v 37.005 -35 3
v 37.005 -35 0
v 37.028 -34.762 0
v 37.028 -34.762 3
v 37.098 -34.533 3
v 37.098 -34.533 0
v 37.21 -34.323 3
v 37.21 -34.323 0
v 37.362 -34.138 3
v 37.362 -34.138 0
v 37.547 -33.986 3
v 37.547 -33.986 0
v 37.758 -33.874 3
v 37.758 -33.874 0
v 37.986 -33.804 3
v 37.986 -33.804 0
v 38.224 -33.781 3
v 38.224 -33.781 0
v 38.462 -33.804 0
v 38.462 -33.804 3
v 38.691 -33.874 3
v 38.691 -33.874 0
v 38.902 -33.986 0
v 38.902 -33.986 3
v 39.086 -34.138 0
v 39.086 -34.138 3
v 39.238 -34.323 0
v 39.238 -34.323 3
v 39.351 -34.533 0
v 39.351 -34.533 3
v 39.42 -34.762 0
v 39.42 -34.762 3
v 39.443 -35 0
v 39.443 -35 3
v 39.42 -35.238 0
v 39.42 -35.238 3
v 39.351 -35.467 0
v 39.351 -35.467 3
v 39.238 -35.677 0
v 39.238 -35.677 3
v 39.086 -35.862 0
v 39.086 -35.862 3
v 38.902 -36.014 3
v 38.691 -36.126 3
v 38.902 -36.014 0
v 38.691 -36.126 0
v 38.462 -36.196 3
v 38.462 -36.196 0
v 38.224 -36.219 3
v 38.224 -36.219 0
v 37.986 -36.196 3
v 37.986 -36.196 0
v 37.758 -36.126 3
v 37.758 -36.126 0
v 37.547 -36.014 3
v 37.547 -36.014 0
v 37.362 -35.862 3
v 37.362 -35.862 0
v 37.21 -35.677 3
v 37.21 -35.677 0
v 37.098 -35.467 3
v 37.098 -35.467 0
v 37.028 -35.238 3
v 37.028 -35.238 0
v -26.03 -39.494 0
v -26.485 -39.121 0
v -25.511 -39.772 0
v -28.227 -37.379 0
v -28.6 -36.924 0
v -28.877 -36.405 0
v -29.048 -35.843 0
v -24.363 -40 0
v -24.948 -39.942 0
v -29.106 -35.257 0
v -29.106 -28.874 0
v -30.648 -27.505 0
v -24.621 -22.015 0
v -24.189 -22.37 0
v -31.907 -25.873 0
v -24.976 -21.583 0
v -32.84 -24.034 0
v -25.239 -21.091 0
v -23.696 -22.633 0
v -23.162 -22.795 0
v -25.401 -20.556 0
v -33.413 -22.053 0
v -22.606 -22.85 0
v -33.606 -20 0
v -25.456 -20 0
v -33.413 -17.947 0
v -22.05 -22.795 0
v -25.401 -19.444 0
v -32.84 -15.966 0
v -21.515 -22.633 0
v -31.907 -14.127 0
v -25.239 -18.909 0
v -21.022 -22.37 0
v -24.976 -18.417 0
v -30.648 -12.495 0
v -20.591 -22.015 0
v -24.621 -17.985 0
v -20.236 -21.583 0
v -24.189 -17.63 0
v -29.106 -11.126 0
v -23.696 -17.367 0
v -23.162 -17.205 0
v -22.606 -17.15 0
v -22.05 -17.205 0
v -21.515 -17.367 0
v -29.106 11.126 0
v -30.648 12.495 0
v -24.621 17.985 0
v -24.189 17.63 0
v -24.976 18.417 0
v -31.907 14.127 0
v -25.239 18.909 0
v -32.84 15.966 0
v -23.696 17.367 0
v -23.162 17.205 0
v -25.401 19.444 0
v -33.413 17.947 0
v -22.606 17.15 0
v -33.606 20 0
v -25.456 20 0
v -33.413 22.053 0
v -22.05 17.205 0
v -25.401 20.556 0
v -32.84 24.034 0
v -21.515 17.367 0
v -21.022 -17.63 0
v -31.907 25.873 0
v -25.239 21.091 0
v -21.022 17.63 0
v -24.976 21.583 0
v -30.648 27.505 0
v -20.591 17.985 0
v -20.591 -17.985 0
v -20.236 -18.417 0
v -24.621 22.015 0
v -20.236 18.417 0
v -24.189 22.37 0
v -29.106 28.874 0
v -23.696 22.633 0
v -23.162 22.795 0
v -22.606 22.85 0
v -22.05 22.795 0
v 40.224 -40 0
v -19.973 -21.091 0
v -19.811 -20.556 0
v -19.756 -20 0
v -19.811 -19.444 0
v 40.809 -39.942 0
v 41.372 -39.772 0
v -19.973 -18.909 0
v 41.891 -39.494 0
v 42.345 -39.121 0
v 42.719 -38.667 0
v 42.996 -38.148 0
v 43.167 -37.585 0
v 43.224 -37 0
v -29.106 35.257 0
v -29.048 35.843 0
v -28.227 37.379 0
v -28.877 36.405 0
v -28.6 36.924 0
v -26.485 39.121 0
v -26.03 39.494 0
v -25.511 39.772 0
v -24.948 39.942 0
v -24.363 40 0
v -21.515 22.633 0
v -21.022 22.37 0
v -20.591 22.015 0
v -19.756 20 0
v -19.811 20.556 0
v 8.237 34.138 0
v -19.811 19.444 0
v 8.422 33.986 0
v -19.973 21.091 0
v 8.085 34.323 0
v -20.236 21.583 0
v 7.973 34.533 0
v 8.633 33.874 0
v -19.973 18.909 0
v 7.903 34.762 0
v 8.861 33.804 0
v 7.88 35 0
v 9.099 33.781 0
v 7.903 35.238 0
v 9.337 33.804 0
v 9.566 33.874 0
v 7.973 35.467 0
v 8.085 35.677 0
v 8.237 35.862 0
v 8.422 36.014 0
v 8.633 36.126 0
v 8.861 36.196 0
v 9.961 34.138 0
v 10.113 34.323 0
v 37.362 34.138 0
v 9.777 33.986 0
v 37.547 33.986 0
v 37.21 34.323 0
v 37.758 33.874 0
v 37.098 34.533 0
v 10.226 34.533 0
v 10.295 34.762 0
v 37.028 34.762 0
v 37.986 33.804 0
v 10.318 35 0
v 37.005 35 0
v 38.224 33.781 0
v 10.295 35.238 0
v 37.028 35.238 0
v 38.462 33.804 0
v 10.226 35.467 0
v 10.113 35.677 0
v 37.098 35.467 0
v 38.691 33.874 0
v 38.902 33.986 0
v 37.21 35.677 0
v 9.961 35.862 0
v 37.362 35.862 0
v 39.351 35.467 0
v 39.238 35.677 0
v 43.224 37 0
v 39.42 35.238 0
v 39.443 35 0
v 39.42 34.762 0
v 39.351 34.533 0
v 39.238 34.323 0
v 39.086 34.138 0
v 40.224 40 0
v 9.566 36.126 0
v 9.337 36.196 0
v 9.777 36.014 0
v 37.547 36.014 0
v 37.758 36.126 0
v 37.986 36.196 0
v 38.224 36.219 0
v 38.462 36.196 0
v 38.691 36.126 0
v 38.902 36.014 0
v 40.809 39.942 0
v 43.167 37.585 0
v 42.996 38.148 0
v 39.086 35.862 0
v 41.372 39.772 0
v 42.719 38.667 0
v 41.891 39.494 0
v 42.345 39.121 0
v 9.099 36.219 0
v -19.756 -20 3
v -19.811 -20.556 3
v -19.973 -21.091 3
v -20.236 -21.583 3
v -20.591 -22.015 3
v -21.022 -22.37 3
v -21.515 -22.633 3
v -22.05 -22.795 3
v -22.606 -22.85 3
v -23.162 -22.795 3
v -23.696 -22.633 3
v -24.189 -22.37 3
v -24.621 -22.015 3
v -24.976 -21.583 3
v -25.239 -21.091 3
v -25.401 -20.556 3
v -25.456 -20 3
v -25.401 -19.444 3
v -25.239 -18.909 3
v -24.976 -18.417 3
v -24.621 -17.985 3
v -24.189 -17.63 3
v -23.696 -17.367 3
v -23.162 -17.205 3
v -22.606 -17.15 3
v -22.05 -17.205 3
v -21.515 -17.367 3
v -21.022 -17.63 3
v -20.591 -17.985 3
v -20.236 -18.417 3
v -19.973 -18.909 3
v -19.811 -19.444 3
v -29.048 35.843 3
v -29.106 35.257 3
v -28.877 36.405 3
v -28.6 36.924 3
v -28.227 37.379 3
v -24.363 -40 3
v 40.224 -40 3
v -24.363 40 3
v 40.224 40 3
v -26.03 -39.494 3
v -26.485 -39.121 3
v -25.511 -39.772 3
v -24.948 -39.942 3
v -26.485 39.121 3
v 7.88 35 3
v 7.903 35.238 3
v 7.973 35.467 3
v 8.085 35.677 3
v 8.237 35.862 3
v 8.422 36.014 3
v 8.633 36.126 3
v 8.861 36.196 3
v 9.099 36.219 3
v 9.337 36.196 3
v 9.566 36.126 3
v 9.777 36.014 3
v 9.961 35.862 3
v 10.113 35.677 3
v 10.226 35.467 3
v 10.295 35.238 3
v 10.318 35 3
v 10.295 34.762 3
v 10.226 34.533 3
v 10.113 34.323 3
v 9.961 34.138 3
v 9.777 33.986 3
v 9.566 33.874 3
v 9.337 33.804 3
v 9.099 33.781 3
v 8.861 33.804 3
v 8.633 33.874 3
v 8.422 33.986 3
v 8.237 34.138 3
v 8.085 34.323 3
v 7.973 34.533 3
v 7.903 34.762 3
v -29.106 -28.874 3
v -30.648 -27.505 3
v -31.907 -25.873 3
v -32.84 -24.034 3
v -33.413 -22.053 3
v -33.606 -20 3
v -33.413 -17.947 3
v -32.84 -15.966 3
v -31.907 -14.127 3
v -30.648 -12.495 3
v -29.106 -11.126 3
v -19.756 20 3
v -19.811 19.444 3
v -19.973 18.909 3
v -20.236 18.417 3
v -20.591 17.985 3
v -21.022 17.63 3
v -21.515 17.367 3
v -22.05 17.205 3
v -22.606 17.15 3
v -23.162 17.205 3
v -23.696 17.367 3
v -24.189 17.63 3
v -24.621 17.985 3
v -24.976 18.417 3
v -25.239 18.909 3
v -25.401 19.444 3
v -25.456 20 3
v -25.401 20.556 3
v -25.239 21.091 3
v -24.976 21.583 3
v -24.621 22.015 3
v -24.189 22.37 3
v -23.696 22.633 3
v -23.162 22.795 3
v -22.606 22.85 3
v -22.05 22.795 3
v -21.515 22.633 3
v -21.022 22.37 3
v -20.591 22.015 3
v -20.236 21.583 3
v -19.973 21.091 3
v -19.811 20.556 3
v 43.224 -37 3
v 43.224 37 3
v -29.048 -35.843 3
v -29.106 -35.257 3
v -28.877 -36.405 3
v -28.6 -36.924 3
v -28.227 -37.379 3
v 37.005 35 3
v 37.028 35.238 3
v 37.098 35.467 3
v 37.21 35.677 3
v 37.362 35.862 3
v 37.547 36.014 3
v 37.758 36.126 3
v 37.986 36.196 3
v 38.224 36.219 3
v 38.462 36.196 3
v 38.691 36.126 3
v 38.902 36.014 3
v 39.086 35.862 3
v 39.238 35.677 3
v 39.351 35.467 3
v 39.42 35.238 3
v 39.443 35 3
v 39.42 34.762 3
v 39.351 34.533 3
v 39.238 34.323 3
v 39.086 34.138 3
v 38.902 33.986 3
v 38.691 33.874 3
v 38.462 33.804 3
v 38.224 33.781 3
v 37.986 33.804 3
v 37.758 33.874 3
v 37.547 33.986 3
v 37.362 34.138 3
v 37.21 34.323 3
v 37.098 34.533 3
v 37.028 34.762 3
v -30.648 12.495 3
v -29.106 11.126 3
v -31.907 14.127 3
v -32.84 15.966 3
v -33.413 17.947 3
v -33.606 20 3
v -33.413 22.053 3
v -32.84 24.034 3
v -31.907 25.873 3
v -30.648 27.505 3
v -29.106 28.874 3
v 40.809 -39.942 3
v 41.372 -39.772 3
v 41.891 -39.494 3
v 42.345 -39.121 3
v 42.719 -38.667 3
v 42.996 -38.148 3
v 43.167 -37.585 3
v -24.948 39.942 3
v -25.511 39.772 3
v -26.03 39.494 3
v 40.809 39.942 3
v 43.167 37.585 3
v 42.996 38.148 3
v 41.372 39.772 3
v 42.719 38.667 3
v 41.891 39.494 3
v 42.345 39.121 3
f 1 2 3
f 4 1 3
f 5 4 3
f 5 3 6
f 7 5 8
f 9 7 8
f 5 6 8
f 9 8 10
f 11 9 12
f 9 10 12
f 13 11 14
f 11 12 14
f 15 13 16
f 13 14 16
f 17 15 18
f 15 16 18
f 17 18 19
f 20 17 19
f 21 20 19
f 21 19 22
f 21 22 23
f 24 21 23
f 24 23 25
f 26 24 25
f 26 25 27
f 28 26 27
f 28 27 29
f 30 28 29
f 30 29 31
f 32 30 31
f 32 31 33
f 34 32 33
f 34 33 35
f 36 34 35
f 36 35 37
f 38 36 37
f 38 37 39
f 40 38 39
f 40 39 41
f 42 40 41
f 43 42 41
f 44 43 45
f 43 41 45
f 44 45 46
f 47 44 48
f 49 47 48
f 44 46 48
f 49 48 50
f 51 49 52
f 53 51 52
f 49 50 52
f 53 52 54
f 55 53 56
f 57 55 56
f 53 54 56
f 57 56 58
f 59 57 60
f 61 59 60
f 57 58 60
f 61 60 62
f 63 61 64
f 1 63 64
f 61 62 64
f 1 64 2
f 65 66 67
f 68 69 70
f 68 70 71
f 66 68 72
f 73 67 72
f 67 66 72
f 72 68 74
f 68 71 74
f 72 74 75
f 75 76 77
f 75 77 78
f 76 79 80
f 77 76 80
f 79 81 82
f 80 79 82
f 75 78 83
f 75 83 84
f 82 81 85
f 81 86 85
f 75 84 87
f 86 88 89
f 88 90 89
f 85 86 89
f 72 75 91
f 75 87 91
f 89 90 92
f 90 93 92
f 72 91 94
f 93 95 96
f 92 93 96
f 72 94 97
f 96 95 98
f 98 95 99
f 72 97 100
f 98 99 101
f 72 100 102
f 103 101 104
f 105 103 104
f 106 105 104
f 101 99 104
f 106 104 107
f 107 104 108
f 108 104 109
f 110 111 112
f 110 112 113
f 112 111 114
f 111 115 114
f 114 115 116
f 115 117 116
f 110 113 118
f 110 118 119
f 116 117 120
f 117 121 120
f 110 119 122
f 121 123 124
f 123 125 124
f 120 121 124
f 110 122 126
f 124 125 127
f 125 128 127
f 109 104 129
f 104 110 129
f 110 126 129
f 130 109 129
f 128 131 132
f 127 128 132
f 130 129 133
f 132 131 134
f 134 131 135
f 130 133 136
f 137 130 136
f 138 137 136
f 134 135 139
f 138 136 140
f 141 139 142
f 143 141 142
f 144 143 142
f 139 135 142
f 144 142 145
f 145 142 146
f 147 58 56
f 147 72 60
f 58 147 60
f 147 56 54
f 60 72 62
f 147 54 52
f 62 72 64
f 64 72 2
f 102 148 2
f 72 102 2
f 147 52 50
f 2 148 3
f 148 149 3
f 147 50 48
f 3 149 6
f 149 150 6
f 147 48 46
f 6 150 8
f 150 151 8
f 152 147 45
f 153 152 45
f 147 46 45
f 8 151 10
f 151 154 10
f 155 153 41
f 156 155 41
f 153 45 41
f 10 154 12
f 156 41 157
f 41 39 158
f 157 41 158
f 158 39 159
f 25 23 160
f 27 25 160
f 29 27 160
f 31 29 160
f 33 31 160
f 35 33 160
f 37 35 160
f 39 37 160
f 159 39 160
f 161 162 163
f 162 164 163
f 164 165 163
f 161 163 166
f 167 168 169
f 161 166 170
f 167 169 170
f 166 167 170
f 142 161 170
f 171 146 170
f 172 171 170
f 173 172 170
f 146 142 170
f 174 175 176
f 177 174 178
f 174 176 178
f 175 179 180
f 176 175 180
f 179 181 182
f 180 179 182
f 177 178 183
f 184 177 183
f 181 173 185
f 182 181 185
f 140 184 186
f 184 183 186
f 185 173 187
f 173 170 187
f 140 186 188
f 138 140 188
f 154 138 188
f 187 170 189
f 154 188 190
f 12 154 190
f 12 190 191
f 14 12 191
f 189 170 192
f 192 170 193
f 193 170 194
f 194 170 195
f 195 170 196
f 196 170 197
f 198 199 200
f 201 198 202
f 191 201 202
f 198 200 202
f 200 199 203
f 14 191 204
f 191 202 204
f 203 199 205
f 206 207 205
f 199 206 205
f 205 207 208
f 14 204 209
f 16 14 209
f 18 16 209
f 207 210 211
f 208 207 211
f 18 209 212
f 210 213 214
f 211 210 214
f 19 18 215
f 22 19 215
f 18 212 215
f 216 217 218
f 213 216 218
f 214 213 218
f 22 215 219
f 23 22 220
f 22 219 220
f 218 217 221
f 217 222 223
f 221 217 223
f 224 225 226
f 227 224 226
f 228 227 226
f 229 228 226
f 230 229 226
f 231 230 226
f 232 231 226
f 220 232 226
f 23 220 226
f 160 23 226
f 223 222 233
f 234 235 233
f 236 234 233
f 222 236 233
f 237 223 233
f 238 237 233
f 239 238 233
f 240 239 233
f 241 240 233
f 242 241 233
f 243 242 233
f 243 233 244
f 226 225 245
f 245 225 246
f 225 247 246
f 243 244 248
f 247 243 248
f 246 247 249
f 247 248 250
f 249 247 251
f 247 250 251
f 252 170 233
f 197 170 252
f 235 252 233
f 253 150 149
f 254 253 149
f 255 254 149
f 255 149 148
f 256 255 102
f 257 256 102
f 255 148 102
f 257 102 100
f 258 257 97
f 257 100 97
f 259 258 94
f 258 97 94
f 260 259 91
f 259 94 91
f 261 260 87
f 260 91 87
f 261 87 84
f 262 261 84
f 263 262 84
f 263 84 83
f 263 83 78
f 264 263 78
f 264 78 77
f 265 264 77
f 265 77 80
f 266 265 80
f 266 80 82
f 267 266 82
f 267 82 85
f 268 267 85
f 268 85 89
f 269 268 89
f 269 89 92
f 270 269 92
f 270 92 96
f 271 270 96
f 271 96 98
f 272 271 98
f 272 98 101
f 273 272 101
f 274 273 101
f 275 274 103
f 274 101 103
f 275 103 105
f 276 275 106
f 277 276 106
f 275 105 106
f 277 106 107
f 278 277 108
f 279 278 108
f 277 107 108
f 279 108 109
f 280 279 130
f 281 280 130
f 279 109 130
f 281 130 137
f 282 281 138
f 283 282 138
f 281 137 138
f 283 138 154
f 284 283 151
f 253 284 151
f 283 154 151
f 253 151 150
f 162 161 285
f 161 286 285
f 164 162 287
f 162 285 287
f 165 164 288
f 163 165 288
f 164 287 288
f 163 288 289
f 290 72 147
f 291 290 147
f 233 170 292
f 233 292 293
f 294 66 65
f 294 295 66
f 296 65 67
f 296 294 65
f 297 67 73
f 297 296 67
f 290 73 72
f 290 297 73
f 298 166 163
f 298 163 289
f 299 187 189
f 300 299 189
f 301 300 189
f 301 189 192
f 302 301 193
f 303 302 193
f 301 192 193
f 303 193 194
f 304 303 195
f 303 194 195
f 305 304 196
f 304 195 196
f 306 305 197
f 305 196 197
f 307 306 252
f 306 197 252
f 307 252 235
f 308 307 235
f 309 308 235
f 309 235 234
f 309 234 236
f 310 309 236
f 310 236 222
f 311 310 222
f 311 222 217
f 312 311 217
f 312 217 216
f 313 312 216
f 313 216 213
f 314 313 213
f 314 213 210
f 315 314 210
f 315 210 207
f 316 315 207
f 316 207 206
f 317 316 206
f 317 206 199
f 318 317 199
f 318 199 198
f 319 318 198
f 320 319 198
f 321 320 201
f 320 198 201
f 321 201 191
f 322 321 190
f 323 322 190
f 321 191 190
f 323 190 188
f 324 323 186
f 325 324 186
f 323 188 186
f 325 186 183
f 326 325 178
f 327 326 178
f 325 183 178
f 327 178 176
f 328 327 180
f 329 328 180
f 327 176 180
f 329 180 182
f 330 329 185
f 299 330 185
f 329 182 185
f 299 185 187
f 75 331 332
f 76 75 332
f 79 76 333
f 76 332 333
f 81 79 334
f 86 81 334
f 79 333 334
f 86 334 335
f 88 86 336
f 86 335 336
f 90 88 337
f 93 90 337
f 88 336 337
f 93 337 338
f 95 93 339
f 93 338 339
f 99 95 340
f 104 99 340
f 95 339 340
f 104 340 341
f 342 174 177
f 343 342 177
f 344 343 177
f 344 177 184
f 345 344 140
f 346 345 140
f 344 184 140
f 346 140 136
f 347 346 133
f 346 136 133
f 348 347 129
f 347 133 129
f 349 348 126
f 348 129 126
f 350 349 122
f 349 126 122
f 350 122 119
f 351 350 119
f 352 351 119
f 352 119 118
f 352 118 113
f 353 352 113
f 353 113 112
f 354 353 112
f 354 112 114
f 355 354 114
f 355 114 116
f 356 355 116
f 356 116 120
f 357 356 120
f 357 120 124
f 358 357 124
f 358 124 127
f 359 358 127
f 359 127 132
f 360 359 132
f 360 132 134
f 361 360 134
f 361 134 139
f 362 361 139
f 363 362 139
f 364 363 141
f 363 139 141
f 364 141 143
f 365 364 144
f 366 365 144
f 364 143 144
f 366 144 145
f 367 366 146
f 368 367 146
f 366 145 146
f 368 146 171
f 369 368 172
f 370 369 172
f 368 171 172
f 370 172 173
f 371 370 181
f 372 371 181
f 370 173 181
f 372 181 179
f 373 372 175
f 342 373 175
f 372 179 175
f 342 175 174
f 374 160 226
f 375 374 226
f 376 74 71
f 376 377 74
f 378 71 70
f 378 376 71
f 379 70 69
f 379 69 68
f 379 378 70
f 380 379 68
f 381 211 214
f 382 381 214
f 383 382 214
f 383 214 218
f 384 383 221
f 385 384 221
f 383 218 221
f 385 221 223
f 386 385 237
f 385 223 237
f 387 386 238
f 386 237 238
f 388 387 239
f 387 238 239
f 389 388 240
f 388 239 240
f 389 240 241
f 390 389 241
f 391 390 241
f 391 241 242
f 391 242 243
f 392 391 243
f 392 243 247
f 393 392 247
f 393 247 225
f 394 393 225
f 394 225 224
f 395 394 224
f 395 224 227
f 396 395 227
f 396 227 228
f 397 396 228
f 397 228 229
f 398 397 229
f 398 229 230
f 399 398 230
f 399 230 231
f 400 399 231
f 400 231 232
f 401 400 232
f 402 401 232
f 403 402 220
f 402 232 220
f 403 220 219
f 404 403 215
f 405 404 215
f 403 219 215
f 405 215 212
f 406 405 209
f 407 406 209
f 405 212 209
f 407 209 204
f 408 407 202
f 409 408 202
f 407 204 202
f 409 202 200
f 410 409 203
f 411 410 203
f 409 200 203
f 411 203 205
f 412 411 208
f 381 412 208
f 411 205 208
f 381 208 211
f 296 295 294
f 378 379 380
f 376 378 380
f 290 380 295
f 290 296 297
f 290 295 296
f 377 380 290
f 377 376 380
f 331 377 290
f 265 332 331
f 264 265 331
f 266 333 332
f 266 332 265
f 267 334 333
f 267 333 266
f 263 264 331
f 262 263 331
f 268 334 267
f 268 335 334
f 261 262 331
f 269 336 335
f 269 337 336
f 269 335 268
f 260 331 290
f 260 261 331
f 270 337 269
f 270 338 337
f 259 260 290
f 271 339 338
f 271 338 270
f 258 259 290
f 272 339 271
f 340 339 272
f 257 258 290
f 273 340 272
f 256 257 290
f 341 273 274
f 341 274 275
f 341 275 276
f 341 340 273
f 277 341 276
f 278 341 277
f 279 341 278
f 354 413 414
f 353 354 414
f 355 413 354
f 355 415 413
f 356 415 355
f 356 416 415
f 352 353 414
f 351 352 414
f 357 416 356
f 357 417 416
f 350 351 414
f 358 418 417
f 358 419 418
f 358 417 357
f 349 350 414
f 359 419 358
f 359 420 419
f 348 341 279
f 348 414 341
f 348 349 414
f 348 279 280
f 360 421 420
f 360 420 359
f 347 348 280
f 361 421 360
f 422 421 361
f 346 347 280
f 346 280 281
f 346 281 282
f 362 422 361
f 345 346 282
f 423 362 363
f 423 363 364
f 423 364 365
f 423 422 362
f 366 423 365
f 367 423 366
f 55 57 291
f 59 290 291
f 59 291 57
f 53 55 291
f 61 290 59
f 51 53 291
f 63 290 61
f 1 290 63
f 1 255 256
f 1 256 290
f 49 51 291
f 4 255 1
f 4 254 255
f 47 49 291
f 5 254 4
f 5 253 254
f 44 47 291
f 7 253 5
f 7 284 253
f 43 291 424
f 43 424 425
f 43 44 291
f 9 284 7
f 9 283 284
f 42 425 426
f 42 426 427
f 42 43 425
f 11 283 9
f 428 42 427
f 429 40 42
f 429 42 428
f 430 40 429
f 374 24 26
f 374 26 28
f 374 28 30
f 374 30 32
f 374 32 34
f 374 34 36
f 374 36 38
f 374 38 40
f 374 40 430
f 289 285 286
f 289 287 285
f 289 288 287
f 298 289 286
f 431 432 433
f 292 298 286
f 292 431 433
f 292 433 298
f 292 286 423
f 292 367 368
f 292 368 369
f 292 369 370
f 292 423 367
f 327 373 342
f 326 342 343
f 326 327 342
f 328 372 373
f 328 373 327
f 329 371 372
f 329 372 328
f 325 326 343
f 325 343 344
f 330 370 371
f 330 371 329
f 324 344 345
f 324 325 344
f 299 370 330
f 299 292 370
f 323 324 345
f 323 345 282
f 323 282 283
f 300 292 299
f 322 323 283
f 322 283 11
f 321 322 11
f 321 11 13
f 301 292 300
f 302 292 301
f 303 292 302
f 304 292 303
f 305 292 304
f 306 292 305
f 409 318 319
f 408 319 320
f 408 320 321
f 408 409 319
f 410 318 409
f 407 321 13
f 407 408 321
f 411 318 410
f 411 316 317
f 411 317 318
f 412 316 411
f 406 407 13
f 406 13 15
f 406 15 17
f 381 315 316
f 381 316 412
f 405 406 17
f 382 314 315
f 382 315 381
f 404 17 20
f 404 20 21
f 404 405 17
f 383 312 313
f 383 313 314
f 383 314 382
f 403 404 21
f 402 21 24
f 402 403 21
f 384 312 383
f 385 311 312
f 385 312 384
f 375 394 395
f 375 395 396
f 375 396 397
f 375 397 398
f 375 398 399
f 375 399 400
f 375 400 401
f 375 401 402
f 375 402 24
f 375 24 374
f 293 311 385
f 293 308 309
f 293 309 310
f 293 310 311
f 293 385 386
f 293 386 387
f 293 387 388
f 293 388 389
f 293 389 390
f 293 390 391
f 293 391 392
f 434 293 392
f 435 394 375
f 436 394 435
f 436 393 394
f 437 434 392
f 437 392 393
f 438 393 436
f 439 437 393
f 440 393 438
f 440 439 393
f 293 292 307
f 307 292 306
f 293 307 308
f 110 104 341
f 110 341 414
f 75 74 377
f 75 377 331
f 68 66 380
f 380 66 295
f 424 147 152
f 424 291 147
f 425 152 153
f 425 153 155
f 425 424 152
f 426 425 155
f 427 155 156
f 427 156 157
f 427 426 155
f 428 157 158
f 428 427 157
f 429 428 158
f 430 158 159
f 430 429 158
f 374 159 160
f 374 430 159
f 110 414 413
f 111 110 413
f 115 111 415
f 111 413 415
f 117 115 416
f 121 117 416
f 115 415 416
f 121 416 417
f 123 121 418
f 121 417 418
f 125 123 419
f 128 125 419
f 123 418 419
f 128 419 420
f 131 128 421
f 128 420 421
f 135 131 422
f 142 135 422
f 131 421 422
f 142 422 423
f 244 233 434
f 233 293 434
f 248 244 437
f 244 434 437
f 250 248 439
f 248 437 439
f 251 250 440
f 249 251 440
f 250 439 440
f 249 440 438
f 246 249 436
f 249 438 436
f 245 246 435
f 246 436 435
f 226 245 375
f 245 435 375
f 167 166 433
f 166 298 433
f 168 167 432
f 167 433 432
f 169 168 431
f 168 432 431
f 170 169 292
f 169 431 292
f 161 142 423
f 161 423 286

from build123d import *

# Parameters (mm, degrees)
BASE_W                = 72.33
BASE_H                = 80
MAIN_DEPTH            = 3
GEAR_AXIS_HOLES_D     = 5.7
CHAMFER1_SIZE         = 3.5
FILLET6_R             = 3
F_2_CLEARANCE_HOLE2_D = 2.4384
BOSS_EXTRUDE4_DEPTH   = 3


with BuildPart() as part:
    # Base → Main (new body)
    with BuildSketch(Plane.XY):
        with Locations((7.059154817, 0)):
            Rectangle(BASE_W, BASE_H)
    extrude(amount=MAIN_DEPTH)

    # Gear Axis Holes (through all)
    with Locations(Plane(origin=(0, 0, 3), x_dir=(-1, 0, 0), z_dir=(0, 0, 1))):
        with Locations((22.605845183, 20), (22.605845183, -20)):
            Hole(GEAR_AXIS_HOLES_D / 2)

    # Chamfer1
    chamfer1_edges = [part.edges().sort_by_distance(p)[0] for p in [
        (-29.105845183, -40, 1.5),
        (-29.105845183, 40, 1.5),
    ]]
    chamfer(chamfer1_edges, length=CHAMFER1_SIZE)

    # Fillet6
    fillet6_edges = [part.edges().sort_by_distance(p)[0] for p in [
        (-25.605845183, -40, 1.5),
        (-29.105845183, 36.5, 1.5),
        (-29.105845183, -36.5, 1.5),
        (-25.605845183, 40, 1.5),
        (43.224154817, 40, 1.5),
        (43.224154817, -40, 1.5),
    ]]
    fillet(fillet6_edges, radius=FILLET6_R)

    # #2 Clearance Hole2 (through all)
    with Locations(Plane.XY.offset(3)):
        with Locations((9.099154817, 35), (38.224154817, 35), (38.224154817, -35)):
            Hole(F_2_CLEARANCE_HOLE2_D / 2)

    # Sketch24 → Boss-Extrude4 (add)
    with BuildSketch(Plane.XY.offset(3)):
        with BuildLine():
            Line((-29.105845183, 28.874119675), (-29.105845183, 11.125880325))
            ThreePointArc((-29.105845183, 11.125880325), (-33.605845183, 20), (-29.105845183, 28.874119675))
        make_face()
        with BuildLine():
            Line((-29.105845183, -11.125880325), (-29.105845183, -28.874119675))
            ThreePointArc((-29.105845183, -28.874119675), (-33.605845183, -20), (-29.105845183, -11.125880325))
        make_face()
    extrude(amount=-BOSS_EXTRUDE4_DEPTH)


solid = part.part
